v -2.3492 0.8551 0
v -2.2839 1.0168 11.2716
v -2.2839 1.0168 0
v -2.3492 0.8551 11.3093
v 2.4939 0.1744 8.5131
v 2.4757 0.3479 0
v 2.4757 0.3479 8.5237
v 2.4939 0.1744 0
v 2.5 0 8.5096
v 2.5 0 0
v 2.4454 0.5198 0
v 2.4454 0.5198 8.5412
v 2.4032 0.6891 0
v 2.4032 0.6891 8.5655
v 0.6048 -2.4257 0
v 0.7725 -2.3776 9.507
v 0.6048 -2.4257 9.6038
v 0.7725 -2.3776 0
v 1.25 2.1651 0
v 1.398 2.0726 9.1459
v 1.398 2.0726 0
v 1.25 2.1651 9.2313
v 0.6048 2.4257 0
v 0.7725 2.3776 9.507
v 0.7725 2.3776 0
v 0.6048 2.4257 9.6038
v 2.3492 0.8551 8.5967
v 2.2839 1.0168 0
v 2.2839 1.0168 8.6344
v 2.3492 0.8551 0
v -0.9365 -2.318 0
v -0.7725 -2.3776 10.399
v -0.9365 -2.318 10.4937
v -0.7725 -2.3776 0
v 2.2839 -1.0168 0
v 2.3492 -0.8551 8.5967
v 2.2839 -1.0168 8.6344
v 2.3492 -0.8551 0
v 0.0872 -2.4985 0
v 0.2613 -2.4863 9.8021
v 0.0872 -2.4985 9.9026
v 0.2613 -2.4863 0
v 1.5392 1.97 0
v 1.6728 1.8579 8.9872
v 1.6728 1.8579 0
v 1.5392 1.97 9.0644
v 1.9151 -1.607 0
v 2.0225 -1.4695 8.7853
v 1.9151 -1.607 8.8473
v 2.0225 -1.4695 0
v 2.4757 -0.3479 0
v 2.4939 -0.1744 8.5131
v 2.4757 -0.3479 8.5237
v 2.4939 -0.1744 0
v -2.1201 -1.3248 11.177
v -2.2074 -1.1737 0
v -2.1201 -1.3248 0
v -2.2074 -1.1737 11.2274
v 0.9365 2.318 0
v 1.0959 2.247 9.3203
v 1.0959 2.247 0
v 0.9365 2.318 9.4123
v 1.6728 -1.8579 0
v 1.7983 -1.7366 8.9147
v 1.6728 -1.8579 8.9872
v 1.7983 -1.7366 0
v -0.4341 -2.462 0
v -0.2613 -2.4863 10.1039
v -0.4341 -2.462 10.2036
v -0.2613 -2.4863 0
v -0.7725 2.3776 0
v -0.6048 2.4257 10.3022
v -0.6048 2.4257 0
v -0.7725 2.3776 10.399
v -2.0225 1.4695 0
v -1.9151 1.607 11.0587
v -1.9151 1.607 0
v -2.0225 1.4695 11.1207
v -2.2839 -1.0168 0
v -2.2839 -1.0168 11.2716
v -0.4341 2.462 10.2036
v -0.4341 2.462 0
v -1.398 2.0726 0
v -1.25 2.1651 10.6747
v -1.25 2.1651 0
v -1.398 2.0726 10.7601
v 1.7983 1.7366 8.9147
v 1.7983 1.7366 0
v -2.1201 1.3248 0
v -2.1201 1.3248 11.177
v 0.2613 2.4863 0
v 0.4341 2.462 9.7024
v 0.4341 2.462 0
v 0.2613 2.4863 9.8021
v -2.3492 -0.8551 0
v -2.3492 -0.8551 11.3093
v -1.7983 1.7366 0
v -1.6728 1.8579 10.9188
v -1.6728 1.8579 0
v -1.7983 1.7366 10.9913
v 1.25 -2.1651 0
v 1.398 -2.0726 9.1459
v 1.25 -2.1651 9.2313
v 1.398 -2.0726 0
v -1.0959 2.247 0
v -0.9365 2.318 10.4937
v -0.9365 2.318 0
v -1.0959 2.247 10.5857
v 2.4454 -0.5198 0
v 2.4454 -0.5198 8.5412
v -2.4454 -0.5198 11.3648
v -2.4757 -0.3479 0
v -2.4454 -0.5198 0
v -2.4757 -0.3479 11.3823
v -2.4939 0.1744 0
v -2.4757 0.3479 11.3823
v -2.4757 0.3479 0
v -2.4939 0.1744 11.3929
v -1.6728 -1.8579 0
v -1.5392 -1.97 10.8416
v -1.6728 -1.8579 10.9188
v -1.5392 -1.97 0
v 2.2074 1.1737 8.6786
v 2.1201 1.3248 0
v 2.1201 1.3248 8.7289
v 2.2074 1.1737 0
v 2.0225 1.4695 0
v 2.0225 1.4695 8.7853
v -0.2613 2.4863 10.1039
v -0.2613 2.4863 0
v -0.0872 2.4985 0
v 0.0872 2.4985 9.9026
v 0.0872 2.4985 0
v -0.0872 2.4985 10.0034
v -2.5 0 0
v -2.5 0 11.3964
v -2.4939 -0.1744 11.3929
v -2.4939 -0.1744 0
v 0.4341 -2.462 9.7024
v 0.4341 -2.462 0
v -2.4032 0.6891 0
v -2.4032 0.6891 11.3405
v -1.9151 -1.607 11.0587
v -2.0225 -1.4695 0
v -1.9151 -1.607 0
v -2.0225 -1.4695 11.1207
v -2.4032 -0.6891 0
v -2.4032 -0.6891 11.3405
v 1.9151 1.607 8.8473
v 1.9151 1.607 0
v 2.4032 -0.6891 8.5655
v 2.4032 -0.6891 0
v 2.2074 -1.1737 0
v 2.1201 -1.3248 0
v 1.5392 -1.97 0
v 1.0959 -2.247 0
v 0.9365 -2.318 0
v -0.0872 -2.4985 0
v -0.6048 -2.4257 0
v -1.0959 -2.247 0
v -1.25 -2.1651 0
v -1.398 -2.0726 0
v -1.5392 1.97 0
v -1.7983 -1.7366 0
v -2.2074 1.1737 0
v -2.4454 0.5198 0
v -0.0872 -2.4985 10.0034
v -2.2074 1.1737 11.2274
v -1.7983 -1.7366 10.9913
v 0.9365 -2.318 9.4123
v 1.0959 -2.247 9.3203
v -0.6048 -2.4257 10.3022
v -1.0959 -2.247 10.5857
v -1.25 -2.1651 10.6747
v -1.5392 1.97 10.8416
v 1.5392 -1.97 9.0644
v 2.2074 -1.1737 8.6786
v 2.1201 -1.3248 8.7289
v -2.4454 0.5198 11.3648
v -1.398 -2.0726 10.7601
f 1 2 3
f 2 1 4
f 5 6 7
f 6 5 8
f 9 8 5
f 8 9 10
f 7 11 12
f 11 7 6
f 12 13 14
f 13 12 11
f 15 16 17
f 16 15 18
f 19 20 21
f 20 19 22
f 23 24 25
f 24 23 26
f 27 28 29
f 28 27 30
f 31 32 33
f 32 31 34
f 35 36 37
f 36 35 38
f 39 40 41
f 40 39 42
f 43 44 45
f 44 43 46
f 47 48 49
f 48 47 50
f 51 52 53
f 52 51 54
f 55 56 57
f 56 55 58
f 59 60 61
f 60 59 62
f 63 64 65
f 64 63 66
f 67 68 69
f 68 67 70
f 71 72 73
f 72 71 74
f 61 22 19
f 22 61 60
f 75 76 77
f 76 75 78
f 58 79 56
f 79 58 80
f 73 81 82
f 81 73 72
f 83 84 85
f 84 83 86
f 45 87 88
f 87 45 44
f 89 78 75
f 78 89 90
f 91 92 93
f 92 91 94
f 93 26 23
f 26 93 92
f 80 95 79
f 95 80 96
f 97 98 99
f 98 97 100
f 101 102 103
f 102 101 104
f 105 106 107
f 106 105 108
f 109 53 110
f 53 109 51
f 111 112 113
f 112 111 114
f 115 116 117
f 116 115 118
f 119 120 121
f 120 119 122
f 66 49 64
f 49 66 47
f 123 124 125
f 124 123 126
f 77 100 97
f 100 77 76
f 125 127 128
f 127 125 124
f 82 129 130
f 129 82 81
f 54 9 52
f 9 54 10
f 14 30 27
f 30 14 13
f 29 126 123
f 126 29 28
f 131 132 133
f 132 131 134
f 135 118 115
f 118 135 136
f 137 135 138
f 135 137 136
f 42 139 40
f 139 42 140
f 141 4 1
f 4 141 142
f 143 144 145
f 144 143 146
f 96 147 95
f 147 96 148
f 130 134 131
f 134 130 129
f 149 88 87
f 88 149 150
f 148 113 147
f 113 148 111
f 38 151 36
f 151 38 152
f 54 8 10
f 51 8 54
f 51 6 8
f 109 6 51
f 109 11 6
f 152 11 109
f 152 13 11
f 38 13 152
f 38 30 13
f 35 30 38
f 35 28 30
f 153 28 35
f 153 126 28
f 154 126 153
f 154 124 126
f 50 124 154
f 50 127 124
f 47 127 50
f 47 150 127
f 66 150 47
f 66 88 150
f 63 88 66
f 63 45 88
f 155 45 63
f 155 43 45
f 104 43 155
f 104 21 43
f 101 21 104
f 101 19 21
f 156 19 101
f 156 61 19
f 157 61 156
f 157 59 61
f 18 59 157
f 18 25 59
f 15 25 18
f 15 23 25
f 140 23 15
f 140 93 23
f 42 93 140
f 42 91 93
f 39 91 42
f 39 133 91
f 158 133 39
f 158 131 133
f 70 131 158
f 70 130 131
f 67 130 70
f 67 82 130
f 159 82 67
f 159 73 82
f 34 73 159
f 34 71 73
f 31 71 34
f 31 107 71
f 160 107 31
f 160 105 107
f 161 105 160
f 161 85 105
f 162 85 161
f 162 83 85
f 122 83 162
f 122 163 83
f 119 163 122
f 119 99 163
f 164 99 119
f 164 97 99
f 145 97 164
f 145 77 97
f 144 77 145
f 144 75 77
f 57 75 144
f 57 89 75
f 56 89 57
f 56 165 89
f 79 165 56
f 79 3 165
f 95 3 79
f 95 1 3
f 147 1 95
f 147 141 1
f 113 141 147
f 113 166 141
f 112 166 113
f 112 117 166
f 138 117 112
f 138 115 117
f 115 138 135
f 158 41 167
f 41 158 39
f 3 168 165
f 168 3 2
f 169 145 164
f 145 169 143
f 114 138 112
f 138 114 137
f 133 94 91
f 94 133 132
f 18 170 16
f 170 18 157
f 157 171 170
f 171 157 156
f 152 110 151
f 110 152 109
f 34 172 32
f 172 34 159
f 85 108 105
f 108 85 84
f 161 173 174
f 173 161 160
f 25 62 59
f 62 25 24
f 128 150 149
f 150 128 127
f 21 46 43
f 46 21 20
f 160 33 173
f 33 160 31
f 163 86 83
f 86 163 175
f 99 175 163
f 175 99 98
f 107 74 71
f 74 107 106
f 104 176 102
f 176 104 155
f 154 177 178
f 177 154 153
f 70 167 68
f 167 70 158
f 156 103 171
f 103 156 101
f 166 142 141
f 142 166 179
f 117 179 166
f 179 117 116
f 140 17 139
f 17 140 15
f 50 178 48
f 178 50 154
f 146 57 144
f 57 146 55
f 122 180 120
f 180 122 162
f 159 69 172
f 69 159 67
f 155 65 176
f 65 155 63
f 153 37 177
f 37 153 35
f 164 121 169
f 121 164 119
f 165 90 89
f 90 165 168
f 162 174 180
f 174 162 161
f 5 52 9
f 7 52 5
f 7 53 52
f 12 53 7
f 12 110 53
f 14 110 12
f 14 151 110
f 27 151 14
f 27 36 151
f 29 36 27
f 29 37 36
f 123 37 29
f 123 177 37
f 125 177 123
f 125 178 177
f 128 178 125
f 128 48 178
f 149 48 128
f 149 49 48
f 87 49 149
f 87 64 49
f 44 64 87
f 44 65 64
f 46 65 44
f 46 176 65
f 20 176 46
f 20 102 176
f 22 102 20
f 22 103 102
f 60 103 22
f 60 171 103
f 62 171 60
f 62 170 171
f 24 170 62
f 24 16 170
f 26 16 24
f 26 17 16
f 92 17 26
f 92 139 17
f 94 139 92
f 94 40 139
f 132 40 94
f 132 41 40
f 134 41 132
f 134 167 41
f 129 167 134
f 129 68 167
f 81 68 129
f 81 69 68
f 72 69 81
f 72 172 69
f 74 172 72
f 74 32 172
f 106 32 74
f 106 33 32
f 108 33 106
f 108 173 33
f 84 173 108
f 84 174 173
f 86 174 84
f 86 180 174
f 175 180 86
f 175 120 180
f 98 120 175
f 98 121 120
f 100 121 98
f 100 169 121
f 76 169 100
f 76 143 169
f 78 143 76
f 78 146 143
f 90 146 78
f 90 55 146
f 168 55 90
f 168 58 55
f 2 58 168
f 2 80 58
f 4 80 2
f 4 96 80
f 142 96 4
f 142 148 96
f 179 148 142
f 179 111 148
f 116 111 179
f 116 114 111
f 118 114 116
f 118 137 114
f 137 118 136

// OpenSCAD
diam=5;
height=10;

$fn=90;

difference() {
    cylinder(h=2*height, d=diam);
    translate([0,0,2*height+1.5]) {
        rotate([0,120,0]) {
            cube([2*height,2*height,2*height], center=true);
        }
    }
}
